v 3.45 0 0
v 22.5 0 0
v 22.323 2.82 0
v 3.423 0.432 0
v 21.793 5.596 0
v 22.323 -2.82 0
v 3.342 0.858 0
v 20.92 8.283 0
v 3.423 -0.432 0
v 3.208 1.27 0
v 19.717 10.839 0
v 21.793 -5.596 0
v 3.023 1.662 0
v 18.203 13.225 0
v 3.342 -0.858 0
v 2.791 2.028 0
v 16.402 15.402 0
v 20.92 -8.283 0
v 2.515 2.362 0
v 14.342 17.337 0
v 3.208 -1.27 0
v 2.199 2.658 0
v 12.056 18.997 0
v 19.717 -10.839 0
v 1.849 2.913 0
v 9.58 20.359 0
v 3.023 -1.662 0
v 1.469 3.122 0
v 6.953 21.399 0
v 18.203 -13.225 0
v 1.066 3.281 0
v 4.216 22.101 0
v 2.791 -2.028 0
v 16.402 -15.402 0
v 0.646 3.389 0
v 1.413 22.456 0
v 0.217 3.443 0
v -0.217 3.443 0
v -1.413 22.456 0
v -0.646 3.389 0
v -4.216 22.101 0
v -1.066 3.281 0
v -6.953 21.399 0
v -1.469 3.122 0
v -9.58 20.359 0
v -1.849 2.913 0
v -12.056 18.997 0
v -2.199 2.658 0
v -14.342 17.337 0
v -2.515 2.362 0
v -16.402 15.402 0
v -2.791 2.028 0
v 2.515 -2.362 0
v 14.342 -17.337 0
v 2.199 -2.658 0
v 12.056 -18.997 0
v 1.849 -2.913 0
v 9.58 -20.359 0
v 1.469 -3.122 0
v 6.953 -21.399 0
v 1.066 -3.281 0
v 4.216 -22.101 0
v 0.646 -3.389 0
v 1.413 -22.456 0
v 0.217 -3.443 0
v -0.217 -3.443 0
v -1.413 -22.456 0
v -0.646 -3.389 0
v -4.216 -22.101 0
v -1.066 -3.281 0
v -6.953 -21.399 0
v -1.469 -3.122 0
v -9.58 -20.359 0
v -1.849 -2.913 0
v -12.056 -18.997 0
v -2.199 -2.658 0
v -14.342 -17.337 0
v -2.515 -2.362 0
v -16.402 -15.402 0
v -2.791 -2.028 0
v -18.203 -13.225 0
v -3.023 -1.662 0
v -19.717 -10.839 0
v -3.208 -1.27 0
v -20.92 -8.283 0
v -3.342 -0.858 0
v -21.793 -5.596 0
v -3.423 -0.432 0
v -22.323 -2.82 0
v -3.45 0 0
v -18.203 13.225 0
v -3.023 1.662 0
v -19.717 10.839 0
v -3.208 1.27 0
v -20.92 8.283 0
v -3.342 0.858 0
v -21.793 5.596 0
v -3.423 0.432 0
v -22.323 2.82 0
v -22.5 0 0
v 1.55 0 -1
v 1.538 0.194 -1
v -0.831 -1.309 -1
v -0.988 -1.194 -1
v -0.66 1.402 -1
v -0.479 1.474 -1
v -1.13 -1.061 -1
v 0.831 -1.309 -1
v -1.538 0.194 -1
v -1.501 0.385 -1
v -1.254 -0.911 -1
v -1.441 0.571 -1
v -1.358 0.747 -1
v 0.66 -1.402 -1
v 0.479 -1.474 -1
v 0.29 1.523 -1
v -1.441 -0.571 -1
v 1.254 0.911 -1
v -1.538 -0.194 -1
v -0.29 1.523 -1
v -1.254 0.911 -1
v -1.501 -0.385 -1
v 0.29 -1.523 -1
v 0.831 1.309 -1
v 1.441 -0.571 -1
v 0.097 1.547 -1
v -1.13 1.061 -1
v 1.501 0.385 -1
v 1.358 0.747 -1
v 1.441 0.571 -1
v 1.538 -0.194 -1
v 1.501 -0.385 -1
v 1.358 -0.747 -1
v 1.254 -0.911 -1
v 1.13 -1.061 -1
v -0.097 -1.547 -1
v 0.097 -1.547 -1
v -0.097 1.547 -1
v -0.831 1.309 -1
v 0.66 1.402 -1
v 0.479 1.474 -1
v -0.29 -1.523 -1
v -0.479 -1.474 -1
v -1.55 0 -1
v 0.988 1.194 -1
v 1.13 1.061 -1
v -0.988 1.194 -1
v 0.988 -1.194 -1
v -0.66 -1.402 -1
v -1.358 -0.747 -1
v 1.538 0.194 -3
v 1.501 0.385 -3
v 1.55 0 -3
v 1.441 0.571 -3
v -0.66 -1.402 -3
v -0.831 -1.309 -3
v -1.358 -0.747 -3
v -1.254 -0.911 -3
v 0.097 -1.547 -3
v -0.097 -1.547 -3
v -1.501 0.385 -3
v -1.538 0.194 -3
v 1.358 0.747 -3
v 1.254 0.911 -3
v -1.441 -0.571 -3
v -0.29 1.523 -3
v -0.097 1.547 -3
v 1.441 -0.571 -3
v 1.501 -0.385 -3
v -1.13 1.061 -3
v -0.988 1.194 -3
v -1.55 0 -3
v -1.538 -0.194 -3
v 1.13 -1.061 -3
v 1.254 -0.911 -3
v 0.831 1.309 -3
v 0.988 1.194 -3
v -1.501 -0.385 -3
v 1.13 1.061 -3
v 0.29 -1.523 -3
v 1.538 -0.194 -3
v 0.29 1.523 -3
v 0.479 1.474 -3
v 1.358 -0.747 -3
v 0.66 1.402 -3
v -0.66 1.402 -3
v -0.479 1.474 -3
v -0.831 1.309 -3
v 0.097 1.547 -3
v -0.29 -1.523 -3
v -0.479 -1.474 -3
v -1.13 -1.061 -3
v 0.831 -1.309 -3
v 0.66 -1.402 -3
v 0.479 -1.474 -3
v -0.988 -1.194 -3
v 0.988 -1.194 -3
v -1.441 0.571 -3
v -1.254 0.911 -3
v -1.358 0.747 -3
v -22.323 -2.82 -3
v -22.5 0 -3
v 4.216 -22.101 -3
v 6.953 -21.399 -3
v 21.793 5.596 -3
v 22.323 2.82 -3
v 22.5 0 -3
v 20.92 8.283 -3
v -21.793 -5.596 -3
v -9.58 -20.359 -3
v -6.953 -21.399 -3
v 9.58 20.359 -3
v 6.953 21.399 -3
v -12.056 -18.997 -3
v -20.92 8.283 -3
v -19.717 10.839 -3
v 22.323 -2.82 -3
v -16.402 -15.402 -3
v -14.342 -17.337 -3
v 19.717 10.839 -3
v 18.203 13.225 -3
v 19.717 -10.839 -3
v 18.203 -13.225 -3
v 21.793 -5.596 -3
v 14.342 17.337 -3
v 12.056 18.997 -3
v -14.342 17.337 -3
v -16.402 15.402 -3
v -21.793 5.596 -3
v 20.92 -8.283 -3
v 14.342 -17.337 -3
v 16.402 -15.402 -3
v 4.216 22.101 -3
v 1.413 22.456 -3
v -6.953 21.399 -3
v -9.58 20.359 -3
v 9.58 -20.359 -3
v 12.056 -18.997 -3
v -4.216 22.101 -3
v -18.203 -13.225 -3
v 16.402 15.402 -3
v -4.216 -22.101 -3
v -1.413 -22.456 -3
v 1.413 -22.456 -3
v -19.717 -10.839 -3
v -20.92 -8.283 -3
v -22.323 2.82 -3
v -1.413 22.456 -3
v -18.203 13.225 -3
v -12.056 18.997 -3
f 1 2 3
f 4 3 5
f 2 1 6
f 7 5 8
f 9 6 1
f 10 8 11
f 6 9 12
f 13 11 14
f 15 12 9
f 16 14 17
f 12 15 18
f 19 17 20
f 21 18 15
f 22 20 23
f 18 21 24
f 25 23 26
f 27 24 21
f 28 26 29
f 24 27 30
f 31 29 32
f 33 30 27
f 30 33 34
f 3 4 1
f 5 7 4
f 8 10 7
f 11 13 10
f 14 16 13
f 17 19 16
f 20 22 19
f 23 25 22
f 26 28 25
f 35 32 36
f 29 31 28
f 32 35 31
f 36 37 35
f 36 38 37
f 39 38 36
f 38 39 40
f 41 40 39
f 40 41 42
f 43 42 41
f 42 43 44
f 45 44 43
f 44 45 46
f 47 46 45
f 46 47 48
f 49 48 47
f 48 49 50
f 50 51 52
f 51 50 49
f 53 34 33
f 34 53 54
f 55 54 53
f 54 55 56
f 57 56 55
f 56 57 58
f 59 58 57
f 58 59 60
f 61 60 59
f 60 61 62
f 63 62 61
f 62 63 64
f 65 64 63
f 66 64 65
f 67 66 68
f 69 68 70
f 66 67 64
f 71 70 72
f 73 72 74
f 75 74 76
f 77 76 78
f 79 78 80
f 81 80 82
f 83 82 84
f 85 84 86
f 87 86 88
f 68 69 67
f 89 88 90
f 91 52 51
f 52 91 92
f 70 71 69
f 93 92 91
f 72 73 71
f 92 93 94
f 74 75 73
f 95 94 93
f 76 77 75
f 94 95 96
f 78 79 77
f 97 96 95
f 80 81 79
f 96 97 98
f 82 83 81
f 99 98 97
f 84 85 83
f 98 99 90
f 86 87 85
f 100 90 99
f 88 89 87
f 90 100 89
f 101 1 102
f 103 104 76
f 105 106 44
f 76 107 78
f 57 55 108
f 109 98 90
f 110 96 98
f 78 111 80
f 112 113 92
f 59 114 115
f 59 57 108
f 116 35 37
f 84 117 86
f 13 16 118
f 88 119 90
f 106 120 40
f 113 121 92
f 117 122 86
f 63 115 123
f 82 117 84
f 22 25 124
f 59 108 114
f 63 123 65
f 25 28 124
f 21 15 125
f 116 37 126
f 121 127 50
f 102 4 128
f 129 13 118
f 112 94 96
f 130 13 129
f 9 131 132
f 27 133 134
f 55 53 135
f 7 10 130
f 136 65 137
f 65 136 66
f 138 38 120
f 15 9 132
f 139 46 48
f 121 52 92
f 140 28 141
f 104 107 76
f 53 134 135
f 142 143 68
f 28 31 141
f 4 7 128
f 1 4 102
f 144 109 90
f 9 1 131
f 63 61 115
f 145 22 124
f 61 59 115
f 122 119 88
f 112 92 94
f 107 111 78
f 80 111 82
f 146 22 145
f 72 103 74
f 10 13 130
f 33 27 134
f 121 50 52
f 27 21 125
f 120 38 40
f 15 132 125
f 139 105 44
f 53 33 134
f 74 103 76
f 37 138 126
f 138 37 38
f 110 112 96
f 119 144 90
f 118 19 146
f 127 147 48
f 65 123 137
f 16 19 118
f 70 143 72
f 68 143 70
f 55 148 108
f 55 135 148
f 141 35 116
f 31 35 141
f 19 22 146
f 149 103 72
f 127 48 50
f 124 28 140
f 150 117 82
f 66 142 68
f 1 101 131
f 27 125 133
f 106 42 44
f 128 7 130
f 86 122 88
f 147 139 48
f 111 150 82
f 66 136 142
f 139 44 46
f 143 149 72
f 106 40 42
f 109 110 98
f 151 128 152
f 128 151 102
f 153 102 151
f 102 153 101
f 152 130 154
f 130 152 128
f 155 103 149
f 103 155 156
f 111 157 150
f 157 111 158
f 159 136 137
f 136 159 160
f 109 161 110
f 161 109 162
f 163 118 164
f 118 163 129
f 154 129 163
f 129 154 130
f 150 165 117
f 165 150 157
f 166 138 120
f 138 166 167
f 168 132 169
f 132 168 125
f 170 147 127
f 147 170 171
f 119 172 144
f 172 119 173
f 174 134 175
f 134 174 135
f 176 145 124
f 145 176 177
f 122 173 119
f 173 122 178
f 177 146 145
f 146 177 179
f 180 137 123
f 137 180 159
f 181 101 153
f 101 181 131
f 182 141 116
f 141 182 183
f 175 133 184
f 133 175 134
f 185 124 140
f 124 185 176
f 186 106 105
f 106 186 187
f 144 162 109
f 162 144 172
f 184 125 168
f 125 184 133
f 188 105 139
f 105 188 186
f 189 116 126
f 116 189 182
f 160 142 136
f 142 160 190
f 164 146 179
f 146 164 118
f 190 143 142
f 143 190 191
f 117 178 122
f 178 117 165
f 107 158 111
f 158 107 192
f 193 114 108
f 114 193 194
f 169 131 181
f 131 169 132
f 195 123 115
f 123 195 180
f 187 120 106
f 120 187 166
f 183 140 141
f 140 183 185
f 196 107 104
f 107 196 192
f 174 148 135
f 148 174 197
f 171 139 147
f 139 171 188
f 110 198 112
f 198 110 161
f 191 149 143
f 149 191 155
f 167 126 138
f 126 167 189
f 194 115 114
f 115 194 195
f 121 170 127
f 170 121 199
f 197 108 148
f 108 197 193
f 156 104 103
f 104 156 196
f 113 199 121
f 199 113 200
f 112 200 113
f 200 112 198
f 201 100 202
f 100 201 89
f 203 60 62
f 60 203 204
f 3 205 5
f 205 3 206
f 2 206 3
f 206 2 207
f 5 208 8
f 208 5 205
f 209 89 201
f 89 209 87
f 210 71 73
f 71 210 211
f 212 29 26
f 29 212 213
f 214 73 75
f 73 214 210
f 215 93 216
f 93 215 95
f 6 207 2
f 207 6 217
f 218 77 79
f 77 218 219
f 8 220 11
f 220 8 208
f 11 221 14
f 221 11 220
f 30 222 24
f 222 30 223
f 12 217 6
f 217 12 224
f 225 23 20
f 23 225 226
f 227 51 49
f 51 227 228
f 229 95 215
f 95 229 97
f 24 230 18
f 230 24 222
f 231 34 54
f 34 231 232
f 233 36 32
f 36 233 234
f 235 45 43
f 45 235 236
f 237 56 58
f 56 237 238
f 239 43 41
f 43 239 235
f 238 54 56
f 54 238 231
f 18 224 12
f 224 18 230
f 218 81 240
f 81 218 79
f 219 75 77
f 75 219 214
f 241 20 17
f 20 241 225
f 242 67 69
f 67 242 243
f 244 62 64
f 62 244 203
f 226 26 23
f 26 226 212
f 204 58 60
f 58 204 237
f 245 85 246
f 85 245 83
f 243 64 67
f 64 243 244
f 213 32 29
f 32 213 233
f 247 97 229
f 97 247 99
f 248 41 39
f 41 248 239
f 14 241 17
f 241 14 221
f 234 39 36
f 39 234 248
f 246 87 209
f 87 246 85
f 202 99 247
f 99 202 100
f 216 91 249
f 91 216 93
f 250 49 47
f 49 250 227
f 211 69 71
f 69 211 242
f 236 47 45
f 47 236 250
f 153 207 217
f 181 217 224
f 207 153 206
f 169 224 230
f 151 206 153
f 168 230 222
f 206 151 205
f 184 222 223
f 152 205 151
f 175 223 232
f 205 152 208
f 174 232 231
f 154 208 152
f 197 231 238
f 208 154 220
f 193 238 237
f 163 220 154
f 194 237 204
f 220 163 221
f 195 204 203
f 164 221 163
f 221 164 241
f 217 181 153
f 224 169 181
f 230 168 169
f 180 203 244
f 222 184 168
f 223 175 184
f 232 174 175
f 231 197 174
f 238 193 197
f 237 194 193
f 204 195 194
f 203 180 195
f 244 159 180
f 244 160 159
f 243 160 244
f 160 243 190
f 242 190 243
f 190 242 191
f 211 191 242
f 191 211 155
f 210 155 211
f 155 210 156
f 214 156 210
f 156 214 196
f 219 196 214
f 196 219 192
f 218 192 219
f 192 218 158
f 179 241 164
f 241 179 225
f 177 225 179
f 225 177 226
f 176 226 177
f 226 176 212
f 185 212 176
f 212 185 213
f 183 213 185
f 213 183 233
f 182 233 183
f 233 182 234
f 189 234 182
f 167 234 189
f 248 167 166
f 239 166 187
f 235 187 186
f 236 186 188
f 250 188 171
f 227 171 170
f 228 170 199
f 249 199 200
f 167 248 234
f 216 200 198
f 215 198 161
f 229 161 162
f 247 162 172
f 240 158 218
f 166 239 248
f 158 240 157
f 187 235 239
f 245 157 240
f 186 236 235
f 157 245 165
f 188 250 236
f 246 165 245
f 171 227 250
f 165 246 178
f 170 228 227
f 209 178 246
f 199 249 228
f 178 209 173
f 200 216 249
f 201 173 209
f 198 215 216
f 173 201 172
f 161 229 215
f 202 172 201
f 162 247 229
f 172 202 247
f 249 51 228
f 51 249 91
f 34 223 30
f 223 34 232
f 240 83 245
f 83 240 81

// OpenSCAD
$fn = 50;

difference() {
	union() {
		translate(v = [0, 0, -3.0]) {
			cylinder(h = 3, r = 22.5);
		}
	}
	union() {
		translate(v = [0, 0, 0]) {
			rotate(a = [0, 0, 0]) {
				difference() {
					union() {
						translate(v = [0, 0, -6.0]) {
							cylinder(h = 6, r = 1.25);
						}
						translate(v = [0, 0, -1.0]) {
							cylinder(h = 1.0, r1 = 1.55, r2 = 3.45);
						}
						translate(v = [0, 0, -6.0]) {
							cylinder(h = 6, r = 1.55);
						}
						translate(v = [0, 0, -6.0]) {
							cylinder(h = 6, r = 1.25);
						}
					}
					union();
				}
			}
		}
	}
}
